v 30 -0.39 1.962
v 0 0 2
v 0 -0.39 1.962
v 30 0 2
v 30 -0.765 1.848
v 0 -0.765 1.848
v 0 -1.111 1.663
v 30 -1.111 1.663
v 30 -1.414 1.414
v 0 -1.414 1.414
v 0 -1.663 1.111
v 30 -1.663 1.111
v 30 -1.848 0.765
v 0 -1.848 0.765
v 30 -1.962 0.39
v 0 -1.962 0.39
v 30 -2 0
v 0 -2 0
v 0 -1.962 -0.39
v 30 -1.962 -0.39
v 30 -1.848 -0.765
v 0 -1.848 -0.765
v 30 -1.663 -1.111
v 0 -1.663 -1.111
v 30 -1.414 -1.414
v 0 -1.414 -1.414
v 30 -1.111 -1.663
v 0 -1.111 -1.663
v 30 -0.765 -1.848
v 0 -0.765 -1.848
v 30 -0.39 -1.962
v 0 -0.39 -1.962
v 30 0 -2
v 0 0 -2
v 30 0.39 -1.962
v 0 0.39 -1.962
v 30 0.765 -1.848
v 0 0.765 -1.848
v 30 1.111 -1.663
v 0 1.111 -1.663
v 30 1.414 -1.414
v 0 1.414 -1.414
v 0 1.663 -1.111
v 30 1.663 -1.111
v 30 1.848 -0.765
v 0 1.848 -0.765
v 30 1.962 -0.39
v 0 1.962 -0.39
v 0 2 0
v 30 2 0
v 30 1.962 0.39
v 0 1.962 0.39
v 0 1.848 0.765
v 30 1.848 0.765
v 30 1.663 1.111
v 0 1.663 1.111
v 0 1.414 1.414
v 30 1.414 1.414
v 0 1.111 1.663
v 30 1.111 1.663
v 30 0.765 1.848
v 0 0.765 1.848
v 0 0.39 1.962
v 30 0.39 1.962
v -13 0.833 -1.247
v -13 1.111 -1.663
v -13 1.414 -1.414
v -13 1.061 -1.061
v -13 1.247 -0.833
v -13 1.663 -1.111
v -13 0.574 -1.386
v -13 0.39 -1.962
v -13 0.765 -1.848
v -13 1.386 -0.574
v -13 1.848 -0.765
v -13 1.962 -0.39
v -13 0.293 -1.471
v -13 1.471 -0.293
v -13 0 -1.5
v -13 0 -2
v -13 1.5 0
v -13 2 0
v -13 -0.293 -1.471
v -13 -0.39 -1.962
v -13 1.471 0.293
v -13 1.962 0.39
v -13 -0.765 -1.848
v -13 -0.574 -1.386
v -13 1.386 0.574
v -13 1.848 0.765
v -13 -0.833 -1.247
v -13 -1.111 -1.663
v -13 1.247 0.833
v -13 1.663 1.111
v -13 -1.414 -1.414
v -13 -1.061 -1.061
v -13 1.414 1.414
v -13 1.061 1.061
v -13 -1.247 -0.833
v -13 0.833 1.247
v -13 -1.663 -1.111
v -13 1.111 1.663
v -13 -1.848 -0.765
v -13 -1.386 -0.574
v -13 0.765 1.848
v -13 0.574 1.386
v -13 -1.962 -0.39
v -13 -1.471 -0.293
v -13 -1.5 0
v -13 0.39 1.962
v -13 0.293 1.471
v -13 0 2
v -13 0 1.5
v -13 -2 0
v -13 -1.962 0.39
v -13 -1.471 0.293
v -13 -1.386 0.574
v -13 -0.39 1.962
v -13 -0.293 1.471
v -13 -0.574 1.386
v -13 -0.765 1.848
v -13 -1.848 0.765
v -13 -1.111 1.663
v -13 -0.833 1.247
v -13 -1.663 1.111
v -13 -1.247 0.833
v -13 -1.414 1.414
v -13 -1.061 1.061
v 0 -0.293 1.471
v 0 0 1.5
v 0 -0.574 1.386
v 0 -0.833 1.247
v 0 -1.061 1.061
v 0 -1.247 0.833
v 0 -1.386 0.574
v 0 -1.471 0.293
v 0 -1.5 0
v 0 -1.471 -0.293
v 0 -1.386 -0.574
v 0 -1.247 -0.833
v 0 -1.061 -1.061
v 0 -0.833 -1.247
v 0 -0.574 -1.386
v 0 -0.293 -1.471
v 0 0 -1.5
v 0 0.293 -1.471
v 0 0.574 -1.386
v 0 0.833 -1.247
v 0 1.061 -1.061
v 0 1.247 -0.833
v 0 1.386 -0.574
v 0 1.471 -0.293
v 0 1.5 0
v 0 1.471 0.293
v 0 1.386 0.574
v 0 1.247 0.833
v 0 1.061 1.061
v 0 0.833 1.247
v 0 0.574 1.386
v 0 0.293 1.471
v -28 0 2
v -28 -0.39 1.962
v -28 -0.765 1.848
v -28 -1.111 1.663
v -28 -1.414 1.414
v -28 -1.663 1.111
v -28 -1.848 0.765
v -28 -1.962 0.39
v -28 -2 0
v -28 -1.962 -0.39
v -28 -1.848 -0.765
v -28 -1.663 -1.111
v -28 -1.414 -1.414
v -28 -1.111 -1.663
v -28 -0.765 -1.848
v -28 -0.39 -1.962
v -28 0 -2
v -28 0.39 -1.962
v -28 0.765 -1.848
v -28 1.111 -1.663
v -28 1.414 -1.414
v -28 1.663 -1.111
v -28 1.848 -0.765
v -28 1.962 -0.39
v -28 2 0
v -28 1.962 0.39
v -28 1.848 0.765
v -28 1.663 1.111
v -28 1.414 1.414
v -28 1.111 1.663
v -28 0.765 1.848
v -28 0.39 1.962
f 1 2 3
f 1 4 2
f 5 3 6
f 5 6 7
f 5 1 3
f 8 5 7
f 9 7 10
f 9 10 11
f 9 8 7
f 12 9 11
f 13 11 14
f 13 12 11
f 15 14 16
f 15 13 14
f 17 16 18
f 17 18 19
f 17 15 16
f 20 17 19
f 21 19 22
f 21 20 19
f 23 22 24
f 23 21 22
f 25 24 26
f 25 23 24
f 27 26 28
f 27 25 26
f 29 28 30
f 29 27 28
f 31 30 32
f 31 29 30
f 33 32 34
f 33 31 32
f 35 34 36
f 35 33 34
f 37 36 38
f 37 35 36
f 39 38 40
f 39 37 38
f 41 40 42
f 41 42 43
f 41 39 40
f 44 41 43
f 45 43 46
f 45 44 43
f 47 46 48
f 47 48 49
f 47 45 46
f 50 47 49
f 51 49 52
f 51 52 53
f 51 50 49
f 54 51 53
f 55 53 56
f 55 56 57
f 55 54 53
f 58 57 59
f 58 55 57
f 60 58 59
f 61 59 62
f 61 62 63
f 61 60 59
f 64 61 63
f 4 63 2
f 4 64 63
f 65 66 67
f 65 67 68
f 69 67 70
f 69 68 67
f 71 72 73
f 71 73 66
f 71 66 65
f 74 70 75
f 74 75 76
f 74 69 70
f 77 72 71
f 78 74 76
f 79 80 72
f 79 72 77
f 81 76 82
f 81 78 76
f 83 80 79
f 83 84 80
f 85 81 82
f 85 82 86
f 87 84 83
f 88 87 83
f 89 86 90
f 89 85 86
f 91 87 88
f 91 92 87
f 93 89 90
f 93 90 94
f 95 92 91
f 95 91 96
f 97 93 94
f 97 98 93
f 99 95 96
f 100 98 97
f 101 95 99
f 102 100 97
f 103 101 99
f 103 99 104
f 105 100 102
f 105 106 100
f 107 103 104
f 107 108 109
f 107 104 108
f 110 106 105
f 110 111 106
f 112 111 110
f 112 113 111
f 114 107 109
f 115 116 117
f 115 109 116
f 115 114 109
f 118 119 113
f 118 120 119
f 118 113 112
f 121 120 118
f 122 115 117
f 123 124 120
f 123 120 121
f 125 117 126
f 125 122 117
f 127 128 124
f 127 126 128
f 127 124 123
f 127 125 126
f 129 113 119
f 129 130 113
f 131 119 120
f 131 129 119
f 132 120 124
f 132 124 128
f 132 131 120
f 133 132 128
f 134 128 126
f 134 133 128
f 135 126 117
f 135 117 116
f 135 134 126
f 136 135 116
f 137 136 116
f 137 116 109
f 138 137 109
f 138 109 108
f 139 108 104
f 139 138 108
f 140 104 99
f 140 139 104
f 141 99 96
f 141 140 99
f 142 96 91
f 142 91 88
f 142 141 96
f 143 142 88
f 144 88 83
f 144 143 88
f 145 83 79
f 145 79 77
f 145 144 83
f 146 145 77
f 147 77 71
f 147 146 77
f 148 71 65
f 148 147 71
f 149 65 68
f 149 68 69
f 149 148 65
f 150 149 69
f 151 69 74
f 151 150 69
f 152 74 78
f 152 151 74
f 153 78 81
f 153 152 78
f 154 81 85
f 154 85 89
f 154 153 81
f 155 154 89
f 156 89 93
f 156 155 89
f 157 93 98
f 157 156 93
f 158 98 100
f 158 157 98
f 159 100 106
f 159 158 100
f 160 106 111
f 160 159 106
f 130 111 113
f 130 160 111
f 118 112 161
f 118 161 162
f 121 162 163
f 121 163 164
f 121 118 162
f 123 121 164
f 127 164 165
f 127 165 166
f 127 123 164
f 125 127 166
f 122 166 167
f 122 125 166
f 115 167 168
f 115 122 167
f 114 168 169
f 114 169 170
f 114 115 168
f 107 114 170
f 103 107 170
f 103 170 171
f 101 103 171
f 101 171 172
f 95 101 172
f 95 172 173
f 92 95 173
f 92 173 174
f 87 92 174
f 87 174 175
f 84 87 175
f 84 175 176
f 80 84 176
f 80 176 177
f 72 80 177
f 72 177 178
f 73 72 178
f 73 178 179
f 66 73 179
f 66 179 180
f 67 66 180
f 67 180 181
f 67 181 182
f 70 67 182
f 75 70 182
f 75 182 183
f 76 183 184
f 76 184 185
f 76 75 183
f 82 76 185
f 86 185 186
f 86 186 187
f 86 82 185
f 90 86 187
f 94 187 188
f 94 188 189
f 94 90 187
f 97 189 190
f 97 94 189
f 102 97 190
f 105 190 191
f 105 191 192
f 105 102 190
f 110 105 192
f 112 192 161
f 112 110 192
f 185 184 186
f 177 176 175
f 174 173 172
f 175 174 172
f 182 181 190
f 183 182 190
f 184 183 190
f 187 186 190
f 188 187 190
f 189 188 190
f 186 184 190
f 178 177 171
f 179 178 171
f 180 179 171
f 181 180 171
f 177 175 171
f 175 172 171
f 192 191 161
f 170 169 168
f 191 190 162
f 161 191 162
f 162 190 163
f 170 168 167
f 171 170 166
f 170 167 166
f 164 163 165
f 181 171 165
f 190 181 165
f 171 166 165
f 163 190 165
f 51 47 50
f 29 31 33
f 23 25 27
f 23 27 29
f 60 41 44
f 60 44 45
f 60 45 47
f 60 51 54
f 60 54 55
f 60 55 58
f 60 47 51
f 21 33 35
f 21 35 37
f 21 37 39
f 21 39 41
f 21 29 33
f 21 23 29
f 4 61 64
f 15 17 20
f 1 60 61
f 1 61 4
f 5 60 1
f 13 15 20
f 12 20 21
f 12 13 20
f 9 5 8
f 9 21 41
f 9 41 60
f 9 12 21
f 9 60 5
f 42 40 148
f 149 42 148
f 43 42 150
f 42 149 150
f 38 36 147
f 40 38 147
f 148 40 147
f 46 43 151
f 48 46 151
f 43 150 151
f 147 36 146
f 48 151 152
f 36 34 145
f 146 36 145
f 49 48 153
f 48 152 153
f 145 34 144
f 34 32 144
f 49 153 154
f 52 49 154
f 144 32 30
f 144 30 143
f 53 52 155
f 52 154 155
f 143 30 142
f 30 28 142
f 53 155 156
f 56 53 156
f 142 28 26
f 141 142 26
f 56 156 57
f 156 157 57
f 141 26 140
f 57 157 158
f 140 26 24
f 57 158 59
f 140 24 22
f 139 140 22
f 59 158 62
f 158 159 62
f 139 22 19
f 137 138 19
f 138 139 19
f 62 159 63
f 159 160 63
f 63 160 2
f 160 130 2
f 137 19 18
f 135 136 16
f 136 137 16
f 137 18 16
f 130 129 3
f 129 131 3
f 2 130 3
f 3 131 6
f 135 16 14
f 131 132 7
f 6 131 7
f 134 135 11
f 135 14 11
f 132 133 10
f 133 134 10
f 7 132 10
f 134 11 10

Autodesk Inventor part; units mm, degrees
ref_plane "YZ Plane" through (0, 0, 0) normal (1, 0, 0) x (0, 1, 0)
ref_plane "XZ Plane" through (0, 0, 0) normal (0, 1, 0) x (-1, 0, 0)
ref_plane "XY Plane" through (0, 0, 0) normal (0, 0, 1) x (1, 0, 0)
sketch "Sketch1" plane through (0, 0, 0) normal (0, 1, 0) x (-1, 0, 0)
  line L0 (13, 2) -> (13, 1.5)
  line L1 (13, 1.5) -> (0, 1.5)
  line L2 (28, 0) -> (28, 2)
  line L3 (28, 2) -> (13, 2)
  line L4 (0, 1.5) -> (0, 2)
  line L5 (0, 2) -> (-30, 2)
  line L6 (-30, 2) -> (-30, 0)
  line L7 (28, 0) -> (0, 0)
  line L8 (0, 0) -> (-30, 0)
  dimension "d5" = 0.5
  dimension "d6" = 15
  dimension "d7" = 0.5
  dimension "d8" = 2
  dimension "d9" = 28
  dimension "d10" = 30
  dimension "d12" = 4
revolve "Revolution1" add sketch "Sketch1" angle 360 about axis through (-28, 0, 0) along (1, 0, 0)
equation "\"d6\" = parA"
equation "\"d9\" = parH"
equation "\"d10\" = stroke"
equation "\"parA\" = 15"
equation "\"parH\" = 28"
equation "\"stroke\" = 30"
properties part number "cylinderRod"
